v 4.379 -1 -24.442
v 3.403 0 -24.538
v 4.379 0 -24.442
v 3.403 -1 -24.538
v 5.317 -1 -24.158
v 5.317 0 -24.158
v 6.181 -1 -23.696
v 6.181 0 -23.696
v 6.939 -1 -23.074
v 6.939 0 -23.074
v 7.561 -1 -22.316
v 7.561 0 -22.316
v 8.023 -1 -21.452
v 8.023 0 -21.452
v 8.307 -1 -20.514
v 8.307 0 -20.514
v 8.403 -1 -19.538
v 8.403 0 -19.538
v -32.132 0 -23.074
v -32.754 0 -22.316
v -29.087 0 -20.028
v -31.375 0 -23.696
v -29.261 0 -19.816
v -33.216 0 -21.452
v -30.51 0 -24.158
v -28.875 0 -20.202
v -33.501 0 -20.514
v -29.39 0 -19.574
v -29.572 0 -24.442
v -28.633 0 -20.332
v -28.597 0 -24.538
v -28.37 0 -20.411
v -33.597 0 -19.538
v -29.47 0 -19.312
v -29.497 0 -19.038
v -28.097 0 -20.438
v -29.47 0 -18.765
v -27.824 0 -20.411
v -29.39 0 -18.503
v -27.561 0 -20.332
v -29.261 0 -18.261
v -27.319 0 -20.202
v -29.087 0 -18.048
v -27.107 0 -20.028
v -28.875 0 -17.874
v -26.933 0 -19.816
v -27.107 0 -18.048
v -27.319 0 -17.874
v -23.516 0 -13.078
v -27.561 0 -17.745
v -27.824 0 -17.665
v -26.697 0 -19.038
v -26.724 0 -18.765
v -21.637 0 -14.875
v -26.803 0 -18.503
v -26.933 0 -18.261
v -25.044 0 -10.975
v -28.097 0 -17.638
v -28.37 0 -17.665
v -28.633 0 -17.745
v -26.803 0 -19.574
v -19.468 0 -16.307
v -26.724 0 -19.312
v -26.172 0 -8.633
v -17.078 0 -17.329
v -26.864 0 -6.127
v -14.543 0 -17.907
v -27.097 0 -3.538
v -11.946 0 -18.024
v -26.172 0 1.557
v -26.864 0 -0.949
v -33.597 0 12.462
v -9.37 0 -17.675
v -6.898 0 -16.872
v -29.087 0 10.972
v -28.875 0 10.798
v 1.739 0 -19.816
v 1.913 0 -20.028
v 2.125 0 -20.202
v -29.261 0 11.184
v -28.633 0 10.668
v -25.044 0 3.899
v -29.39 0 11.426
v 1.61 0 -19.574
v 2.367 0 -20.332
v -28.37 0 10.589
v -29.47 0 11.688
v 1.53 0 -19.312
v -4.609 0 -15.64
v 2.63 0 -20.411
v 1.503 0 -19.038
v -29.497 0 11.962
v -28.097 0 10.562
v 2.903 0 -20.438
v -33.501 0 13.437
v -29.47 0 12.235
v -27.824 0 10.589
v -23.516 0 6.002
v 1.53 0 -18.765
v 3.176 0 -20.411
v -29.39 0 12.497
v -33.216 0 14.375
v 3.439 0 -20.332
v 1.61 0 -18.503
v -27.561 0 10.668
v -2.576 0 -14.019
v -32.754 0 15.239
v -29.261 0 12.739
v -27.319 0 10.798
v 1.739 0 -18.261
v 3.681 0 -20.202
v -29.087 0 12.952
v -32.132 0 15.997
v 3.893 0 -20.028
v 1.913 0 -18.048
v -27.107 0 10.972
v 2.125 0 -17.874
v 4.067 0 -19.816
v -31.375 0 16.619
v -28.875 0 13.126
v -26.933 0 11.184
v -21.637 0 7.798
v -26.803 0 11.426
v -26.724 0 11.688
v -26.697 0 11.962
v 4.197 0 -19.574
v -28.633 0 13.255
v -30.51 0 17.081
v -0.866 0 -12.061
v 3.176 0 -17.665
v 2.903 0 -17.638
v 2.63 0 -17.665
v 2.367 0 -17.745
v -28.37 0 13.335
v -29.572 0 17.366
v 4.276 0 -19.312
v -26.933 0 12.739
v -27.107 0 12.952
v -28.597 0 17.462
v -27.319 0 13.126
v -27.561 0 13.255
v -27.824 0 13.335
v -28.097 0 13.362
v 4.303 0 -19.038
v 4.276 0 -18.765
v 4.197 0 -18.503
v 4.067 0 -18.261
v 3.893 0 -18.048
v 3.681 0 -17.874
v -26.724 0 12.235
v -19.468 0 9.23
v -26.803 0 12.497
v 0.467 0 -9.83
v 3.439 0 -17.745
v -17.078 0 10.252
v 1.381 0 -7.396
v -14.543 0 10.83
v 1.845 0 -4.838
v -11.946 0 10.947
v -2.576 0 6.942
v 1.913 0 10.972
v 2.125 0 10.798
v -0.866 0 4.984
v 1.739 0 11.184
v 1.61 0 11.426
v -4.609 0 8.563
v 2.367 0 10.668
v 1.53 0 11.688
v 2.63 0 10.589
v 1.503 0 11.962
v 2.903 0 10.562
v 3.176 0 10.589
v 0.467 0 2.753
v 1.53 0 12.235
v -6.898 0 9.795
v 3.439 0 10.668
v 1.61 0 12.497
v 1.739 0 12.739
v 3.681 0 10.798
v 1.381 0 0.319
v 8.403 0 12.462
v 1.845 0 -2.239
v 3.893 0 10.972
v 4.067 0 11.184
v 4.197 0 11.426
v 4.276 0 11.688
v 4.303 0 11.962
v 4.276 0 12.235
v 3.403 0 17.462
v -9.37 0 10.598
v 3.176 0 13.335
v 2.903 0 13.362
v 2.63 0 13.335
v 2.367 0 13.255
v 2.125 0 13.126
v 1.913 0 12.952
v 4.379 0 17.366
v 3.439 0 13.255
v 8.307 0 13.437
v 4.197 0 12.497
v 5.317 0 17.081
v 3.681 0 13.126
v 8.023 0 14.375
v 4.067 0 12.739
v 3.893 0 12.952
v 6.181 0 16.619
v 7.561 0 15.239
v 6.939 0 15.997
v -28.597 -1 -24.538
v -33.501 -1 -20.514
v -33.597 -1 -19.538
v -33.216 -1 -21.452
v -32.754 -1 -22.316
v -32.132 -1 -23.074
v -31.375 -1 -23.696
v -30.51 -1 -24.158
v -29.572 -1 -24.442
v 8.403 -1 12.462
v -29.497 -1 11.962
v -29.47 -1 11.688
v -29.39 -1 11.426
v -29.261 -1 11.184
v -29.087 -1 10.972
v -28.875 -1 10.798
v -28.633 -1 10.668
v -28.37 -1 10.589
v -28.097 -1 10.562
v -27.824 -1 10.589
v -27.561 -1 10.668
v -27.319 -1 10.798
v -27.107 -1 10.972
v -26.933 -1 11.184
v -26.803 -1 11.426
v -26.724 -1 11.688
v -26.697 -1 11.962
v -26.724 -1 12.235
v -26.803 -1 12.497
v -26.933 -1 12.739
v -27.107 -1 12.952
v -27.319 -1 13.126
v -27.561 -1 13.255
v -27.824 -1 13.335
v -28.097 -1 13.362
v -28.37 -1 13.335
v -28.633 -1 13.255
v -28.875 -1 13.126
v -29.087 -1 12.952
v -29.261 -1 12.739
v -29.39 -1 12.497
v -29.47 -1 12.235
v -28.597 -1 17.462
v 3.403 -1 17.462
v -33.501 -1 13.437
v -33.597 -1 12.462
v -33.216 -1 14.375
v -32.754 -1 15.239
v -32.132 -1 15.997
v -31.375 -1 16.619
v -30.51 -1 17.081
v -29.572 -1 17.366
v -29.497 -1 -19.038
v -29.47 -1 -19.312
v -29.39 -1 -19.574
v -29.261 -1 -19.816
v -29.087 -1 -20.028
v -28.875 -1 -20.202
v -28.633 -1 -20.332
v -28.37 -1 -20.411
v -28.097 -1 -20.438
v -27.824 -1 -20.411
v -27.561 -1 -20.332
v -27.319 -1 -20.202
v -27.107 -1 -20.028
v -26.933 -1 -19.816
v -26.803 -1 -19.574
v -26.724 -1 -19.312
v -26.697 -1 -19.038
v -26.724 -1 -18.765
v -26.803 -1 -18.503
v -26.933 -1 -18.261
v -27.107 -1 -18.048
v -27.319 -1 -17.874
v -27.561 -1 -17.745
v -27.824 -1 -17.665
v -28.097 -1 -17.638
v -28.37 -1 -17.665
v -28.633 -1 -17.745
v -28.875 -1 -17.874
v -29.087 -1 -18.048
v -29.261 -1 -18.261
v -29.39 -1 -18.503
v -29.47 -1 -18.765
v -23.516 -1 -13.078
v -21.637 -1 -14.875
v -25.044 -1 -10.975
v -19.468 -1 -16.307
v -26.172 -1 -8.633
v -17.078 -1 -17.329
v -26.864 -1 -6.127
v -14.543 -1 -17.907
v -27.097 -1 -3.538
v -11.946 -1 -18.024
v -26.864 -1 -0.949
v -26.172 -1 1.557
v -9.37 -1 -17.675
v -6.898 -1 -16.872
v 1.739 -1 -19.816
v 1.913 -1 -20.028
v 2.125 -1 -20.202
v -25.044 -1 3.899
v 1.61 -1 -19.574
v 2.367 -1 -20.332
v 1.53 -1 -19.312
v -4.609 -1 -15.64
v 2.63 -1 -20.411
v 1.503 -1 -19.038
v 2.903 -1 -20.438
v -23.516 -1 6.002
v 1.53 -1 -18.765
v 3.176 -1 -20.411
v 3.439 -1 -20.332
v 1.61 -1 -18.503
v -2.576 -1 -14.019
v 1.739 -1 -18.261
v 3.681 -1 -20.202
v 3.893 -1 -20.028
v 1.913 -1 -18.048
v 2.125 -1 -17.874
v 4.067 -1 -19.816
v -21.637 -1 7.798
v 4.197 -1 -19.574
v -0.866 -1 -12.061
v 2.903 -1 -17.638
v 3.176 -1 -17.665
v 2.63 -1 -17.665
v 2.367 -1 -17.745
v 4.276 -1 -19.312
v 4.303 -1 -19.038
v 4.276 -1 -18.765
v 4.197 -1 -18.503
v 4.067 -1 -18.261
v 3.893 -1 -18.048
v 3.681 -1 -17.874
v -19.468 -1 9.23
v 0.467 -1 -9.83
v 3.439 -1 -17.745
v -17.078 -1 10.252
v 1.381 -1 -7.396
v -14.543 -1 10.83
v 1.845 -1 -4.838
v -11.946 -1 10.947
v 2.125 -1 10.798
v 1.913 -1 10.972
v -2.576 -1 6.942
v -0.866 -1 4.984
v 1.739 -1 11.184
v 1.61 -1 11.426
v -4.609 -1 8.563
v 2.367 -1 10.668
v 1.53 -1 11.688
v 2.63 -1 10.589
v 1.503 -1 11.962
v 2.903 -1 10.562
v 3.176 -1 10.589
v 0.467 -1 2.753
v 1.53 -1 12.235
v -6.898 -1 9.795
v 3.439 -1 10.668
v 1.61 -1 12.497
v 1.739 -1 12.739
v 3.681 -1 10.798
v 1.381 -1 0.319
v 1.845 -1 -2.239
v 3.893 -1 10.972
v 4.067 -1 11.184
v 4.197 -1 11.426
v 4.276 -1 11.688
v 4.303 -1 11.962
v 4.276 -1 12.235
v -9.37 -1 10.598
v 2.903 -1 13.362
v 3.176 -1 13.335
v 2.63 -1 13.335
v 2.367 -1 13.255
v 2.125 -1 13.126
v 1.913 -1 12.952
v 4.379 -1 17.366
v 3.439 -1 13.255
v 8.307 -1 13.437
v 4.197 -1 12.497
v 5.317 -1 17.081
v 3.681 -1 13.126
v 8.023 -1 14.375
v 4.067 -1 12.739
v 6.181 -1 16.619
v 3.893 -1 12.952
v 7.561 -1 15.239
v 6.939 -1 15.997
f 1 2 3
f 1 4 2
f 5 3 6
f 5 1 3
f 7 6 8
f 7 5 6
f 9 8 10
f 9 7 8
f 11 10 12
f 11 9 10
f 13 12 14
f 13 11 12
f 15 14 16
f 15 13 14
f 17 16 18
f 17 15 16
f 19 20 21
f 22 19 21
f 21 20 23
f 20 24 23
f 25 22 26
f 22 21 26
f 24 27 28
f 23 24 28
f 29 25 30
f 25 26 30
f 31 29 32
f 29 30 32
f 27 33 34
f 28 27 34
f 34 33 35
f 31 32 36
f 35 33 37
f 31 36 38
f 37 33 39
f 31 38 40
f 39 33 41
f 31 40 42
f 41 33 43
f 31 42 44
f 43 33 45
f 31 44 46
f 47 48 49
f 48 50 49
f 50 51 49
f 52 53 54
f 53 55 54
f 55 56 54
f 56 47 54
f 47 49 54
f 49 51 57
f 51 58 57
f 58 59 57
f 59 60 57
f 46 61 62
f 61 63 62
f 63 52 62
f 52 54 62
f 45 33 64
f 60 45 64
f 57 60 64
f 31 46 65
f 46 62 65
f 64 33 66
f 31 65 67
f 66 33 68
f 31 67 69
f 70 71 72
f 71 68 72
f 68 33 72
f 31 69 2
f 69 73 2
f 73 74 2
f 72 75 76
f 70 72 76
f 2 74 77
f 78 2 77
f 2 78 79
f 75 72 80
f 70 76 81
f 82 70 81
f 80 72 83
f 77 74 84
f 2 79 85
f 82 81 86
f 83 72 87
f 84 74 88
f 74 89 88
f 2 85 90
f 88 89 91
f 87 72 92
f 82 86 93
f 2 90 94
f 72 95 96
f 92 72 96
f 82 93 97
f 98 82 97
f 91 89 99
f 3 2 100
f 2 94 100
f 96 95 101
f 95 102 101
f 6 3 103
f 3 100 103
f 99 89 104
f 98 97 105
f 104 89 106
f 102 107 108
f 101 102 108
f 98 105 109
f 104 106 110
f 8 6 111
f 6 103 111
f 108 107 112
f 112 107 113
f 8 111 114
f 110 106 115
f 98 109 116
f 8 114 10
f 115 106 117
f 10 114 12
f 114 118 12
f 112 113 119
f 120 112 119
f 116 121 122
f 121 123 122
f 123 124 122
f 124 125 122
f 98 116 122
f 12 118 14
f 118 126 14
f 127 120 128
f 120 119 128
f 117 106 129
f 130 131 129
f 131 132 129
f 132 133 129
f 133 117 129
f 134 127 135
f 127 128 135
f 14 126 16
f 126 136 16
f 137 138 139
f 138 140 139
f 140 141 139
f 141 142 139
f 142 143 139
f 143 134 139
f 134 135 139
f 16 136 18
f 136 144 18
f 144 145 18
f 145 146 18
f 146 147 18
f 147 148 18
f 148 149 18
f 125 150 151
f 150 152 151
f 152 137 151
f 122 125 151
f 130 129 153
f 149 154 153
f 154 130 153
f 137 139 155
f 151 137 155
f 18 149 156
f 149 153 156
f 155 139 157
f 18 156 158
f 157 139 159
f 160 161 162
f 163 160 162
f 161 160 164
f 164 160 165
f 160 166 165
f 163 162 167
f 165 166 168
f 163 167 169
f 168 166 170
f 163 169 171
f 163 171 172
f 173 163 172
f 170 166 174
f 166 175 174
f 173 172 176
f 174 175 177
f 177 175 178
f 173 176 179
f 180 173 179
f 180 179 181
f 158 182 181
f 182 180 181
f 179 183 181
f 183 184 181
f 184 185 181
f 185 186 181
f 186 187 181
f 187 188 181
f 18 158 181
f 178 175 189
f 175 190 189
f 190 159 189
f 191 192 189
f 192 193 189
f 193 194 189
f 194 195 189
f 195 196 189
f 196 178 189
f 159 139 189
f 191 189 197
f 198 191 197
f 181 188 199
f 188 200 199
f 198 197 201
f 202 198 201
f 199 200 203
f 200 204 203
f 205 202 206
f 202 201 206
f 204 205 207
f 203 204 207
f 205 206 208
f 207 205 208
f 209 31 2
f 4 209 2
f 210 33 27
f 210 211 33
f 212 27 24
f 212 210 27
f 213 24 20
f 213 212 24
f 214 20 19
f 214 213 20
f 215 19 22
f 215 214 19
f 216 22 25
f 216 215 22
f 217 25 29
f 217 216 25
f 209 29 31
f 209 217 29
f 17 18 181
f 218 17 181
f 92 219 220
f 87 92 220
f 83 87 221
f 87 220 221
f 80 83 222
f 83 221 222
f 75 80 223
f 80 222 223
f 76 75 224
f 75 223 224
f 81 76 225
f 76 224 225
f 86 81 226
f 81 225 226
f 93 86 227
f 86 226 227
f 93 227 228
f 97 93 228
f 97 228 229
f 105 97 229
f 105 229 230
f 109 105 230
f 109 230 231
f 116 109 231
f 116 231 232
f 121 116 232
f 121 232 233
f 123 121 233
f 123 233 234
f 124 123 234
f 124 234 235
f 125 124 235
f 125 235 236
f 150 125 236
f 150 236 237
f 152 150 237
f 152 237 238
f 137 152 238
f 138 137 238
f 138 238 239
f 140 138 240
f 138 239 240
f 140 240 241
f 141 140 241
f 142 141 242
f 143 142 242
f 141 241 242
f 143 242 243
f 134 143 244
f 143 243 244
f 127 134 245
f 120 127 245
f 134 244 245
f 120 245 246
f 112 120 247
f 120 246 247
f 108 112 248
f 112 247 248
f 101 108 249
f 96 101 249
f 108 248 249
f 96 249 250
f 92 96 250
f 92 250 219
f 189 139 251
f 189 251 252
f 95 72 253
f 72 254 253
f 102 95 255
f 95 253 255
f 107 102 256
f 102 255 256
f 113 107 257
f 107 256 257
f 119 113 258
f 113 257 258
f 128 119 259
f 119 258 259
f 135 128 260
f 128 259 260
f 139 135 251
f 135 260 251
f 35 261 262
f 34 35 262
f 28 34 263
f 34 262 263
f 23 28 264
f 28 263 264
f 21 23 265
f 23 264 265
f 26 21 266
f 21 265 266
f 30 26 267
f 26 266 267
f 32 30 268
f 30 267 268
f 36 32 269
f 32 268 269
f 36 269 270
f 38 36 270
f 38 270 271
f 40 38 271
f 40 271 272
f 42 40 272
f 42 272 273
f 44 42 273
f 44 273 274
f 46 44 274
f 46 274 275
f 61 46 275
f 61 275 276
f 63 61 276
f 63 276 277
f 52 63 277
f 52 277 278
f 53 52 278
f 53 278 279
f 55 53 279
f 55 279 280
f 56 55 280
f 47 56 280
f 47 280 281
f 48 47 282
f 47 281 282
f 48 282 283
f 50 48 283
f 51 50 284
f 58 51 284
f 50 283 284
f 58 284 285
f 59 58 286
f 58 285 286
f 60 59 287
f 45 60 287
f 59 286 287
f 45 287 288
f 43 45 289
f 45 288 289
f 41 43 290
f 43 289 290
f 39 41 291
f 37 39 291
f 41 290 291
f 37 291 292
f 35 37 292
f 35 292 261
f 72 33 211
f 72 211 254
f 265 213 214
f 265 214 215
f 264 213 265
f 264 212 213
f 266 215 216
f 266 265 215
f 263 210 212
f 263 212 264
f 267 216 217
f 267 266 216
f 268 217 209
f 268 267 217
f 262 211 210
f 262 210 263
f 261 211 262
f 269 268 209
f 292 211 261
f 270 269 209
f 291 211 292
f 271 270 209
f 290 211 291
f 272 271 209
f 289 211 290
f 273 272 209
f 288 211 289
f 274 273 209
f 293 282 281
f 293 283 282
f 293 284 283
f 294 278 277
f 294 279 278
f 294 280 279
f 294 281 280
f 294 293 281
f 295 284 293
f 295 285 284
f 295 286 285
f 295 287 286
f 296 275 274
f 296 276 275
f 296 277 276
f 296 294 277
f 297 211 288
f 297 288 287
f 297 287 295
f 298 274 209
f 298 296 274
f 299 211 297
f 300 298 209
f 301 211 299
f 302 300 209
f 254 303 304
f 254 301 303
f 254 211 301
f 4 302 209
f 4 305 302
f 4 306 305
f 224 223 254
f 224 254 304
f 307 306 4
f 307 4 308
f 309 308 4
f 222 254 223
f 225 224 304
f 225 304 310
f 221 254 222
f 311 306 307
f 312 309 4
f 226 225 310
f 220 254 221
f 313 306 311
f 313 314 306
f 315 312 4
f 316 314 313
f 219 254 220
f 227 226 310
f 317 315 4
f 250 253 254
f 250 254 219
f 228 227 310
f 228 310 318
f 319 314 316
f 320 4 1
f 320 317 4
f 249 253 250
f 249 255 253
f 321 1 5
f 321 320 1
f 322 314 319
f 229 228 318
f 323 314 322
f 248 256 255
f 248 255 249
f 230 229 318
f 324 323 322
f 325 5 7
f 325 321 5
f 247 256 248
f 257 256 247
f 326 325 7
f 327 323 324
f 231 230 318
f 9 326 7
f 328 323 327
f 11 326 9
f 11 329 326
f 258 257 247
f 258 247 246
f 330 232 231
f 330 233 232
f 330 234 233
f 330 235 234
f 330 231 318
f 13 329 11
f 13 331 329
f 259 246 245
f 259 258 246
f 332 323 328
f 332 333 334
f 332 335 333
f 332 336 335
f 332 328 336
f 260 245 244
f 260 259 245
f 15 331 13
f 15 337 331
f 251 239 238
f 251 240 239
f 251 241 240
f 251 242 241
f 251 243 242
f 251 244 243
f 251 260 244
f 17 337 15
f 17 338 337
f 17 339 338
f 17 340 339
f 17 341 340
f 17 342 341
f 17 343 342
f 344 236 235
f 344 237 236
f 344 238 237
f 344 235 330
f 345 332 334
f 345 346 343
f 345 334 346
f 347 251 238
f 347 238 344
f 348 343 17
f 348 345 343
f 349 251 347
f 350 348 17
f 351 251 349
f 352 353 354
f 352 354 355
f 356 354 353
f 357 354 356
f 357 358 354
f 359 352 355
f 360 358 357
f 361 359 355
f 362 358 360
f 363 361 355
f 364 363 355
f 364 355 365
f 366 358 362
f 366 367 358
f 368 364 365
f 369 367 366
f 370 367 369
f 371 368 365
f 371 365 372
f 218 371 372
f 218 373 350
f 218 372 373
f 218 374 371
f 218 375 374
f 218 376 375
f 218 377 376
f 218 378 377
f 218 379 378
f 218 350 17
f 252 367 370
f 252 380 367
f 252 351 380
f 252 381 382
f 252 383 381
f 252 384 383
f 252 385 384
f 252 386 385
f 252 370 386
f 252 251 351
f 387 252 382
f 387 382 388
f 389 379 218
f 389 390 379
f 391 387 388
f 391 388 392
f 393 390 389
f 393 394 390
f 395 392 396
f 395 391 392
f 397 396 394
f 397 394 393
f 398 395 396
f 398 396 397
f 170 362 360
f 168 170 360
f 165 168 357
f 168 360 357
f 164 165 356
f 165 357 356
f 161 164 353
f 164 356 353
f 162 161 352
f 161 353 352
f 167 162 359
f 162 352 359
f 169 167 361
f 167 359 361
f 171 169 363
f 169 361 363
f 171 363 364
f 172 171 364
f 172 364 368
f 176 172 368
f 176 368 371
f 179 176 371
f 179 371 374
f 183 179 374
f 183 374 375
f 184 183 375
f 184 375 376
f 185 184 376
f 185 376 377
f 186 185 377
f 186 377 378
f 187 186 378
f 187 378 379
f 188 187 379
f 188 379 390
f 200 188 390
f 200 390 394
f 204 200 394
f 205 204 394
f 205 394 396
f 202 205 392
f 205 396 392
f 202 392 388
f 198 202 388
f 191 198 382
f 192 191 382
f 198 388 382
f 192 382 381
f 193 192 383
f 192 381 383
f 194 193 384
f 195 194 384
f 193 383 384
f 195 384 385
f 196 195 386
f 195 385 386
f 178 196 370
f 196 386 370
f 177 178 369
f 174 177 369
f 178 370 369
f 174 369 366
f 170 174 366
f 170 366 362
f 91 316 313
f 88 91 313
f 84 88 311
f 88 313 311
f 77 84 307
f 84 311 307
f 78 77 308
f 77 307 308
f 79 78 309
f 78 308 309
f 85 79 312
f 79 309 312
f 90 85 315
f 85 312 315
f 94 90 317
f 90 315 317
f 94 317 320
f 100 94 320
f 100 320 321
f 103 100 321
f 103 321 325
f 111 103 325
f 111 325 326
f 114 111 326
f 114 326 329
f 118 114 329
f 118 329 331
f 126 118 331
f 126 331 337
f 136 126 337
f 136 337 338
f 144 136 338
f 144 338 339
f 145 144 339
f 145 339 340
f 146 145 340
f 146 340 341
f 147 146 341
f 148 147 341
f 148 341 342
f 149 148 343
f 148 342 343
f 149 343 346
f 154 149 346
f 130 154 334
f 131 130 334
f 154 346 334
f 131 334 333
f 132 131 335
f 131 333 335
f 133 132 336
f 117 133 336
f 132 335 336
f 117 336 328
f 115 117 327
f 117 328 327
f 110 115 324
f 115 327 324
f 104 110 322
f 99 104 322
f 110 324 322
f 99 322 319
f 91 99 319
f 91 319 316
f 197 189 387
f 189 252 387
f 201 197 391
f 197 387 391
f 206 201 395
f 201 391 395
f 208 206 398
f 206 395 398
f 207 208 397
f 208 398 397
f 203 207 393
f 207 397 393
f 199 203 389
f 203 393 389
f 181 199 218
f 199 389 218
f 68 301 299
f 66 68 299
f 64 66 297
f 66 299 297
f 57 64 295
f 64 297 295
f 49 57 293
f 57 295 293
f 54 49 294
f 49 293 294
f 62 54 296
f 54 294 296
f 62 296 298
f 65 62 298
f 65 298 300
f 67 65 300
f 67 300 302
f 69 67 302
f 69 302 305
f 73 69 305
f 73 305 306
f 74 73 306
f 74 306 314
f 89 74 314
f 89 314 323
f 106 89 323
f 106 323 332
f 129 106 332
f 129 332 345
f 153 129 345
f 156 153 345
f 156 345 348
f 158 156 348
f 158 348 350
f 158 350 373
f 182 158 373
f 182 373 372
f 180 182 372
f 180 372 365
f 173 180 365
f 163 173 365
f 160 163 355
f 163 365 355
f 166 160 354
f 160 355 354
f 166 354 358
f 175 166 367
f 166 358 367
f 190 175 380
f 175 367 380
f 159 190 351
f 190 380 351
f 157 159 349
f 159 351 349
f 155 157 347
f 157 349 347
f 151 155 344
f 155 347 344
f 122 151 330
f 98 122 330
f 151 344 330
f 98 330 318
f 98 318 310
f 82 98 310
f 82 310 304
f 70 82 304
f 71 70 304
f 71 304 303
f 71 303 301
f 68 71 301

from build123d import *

# Parameters (mm, degrees)
F0_W     = 42
F0_H     = 42
F1_DEPTH = 1
F2_D     = 29
F3_D     = 2.8
F4_R     = 5


with BuildPart() as f1:
    # F0 (on Front) → F1 (new body)
    with BuildSketch(Plane.XZ):
        with Locations((-12.5967783645, -3.5383866066)):
            Rectangle(F0_W, F0_H)
    extrude(amount=F1_DEPTH)

    # F2 (through all)
    with Locations(Plane(origin=(0, 0, 0), x_dir=(1, 0, 0), z_dir=(0, 1, 0))):
        with Locations((-12.5967783645, 3.5383866066)):
            Hole(F2_D / 2)

    # F3 (through all)
    with Locations(Plane(origin=(0, 0, 0), x_dir=(1, 0, 0), z_dir=(0, 1, 0))):
        with Locations((-28.0967783645, -11.9616133934), (2.9032216355, -11.9616133934), (2.9032216355, 19.0383866066), (-28.0967783645, 19.0383866066)):
            Hole(F3_D / 2)

    # F4
    f4_edges = [f1.edges().sort_by_distance(p)[0] for p in [
        (-33.596778, -0.5, 17.461613),
        (-33.596778, -0.5, -24.538387),
        (8.403222, -0.5, 17.461613),
        (8.403222, -0.5, -24.538387),
    ]]
    fillet(f4_edges, radius=F4_R)


solid = f1.part
